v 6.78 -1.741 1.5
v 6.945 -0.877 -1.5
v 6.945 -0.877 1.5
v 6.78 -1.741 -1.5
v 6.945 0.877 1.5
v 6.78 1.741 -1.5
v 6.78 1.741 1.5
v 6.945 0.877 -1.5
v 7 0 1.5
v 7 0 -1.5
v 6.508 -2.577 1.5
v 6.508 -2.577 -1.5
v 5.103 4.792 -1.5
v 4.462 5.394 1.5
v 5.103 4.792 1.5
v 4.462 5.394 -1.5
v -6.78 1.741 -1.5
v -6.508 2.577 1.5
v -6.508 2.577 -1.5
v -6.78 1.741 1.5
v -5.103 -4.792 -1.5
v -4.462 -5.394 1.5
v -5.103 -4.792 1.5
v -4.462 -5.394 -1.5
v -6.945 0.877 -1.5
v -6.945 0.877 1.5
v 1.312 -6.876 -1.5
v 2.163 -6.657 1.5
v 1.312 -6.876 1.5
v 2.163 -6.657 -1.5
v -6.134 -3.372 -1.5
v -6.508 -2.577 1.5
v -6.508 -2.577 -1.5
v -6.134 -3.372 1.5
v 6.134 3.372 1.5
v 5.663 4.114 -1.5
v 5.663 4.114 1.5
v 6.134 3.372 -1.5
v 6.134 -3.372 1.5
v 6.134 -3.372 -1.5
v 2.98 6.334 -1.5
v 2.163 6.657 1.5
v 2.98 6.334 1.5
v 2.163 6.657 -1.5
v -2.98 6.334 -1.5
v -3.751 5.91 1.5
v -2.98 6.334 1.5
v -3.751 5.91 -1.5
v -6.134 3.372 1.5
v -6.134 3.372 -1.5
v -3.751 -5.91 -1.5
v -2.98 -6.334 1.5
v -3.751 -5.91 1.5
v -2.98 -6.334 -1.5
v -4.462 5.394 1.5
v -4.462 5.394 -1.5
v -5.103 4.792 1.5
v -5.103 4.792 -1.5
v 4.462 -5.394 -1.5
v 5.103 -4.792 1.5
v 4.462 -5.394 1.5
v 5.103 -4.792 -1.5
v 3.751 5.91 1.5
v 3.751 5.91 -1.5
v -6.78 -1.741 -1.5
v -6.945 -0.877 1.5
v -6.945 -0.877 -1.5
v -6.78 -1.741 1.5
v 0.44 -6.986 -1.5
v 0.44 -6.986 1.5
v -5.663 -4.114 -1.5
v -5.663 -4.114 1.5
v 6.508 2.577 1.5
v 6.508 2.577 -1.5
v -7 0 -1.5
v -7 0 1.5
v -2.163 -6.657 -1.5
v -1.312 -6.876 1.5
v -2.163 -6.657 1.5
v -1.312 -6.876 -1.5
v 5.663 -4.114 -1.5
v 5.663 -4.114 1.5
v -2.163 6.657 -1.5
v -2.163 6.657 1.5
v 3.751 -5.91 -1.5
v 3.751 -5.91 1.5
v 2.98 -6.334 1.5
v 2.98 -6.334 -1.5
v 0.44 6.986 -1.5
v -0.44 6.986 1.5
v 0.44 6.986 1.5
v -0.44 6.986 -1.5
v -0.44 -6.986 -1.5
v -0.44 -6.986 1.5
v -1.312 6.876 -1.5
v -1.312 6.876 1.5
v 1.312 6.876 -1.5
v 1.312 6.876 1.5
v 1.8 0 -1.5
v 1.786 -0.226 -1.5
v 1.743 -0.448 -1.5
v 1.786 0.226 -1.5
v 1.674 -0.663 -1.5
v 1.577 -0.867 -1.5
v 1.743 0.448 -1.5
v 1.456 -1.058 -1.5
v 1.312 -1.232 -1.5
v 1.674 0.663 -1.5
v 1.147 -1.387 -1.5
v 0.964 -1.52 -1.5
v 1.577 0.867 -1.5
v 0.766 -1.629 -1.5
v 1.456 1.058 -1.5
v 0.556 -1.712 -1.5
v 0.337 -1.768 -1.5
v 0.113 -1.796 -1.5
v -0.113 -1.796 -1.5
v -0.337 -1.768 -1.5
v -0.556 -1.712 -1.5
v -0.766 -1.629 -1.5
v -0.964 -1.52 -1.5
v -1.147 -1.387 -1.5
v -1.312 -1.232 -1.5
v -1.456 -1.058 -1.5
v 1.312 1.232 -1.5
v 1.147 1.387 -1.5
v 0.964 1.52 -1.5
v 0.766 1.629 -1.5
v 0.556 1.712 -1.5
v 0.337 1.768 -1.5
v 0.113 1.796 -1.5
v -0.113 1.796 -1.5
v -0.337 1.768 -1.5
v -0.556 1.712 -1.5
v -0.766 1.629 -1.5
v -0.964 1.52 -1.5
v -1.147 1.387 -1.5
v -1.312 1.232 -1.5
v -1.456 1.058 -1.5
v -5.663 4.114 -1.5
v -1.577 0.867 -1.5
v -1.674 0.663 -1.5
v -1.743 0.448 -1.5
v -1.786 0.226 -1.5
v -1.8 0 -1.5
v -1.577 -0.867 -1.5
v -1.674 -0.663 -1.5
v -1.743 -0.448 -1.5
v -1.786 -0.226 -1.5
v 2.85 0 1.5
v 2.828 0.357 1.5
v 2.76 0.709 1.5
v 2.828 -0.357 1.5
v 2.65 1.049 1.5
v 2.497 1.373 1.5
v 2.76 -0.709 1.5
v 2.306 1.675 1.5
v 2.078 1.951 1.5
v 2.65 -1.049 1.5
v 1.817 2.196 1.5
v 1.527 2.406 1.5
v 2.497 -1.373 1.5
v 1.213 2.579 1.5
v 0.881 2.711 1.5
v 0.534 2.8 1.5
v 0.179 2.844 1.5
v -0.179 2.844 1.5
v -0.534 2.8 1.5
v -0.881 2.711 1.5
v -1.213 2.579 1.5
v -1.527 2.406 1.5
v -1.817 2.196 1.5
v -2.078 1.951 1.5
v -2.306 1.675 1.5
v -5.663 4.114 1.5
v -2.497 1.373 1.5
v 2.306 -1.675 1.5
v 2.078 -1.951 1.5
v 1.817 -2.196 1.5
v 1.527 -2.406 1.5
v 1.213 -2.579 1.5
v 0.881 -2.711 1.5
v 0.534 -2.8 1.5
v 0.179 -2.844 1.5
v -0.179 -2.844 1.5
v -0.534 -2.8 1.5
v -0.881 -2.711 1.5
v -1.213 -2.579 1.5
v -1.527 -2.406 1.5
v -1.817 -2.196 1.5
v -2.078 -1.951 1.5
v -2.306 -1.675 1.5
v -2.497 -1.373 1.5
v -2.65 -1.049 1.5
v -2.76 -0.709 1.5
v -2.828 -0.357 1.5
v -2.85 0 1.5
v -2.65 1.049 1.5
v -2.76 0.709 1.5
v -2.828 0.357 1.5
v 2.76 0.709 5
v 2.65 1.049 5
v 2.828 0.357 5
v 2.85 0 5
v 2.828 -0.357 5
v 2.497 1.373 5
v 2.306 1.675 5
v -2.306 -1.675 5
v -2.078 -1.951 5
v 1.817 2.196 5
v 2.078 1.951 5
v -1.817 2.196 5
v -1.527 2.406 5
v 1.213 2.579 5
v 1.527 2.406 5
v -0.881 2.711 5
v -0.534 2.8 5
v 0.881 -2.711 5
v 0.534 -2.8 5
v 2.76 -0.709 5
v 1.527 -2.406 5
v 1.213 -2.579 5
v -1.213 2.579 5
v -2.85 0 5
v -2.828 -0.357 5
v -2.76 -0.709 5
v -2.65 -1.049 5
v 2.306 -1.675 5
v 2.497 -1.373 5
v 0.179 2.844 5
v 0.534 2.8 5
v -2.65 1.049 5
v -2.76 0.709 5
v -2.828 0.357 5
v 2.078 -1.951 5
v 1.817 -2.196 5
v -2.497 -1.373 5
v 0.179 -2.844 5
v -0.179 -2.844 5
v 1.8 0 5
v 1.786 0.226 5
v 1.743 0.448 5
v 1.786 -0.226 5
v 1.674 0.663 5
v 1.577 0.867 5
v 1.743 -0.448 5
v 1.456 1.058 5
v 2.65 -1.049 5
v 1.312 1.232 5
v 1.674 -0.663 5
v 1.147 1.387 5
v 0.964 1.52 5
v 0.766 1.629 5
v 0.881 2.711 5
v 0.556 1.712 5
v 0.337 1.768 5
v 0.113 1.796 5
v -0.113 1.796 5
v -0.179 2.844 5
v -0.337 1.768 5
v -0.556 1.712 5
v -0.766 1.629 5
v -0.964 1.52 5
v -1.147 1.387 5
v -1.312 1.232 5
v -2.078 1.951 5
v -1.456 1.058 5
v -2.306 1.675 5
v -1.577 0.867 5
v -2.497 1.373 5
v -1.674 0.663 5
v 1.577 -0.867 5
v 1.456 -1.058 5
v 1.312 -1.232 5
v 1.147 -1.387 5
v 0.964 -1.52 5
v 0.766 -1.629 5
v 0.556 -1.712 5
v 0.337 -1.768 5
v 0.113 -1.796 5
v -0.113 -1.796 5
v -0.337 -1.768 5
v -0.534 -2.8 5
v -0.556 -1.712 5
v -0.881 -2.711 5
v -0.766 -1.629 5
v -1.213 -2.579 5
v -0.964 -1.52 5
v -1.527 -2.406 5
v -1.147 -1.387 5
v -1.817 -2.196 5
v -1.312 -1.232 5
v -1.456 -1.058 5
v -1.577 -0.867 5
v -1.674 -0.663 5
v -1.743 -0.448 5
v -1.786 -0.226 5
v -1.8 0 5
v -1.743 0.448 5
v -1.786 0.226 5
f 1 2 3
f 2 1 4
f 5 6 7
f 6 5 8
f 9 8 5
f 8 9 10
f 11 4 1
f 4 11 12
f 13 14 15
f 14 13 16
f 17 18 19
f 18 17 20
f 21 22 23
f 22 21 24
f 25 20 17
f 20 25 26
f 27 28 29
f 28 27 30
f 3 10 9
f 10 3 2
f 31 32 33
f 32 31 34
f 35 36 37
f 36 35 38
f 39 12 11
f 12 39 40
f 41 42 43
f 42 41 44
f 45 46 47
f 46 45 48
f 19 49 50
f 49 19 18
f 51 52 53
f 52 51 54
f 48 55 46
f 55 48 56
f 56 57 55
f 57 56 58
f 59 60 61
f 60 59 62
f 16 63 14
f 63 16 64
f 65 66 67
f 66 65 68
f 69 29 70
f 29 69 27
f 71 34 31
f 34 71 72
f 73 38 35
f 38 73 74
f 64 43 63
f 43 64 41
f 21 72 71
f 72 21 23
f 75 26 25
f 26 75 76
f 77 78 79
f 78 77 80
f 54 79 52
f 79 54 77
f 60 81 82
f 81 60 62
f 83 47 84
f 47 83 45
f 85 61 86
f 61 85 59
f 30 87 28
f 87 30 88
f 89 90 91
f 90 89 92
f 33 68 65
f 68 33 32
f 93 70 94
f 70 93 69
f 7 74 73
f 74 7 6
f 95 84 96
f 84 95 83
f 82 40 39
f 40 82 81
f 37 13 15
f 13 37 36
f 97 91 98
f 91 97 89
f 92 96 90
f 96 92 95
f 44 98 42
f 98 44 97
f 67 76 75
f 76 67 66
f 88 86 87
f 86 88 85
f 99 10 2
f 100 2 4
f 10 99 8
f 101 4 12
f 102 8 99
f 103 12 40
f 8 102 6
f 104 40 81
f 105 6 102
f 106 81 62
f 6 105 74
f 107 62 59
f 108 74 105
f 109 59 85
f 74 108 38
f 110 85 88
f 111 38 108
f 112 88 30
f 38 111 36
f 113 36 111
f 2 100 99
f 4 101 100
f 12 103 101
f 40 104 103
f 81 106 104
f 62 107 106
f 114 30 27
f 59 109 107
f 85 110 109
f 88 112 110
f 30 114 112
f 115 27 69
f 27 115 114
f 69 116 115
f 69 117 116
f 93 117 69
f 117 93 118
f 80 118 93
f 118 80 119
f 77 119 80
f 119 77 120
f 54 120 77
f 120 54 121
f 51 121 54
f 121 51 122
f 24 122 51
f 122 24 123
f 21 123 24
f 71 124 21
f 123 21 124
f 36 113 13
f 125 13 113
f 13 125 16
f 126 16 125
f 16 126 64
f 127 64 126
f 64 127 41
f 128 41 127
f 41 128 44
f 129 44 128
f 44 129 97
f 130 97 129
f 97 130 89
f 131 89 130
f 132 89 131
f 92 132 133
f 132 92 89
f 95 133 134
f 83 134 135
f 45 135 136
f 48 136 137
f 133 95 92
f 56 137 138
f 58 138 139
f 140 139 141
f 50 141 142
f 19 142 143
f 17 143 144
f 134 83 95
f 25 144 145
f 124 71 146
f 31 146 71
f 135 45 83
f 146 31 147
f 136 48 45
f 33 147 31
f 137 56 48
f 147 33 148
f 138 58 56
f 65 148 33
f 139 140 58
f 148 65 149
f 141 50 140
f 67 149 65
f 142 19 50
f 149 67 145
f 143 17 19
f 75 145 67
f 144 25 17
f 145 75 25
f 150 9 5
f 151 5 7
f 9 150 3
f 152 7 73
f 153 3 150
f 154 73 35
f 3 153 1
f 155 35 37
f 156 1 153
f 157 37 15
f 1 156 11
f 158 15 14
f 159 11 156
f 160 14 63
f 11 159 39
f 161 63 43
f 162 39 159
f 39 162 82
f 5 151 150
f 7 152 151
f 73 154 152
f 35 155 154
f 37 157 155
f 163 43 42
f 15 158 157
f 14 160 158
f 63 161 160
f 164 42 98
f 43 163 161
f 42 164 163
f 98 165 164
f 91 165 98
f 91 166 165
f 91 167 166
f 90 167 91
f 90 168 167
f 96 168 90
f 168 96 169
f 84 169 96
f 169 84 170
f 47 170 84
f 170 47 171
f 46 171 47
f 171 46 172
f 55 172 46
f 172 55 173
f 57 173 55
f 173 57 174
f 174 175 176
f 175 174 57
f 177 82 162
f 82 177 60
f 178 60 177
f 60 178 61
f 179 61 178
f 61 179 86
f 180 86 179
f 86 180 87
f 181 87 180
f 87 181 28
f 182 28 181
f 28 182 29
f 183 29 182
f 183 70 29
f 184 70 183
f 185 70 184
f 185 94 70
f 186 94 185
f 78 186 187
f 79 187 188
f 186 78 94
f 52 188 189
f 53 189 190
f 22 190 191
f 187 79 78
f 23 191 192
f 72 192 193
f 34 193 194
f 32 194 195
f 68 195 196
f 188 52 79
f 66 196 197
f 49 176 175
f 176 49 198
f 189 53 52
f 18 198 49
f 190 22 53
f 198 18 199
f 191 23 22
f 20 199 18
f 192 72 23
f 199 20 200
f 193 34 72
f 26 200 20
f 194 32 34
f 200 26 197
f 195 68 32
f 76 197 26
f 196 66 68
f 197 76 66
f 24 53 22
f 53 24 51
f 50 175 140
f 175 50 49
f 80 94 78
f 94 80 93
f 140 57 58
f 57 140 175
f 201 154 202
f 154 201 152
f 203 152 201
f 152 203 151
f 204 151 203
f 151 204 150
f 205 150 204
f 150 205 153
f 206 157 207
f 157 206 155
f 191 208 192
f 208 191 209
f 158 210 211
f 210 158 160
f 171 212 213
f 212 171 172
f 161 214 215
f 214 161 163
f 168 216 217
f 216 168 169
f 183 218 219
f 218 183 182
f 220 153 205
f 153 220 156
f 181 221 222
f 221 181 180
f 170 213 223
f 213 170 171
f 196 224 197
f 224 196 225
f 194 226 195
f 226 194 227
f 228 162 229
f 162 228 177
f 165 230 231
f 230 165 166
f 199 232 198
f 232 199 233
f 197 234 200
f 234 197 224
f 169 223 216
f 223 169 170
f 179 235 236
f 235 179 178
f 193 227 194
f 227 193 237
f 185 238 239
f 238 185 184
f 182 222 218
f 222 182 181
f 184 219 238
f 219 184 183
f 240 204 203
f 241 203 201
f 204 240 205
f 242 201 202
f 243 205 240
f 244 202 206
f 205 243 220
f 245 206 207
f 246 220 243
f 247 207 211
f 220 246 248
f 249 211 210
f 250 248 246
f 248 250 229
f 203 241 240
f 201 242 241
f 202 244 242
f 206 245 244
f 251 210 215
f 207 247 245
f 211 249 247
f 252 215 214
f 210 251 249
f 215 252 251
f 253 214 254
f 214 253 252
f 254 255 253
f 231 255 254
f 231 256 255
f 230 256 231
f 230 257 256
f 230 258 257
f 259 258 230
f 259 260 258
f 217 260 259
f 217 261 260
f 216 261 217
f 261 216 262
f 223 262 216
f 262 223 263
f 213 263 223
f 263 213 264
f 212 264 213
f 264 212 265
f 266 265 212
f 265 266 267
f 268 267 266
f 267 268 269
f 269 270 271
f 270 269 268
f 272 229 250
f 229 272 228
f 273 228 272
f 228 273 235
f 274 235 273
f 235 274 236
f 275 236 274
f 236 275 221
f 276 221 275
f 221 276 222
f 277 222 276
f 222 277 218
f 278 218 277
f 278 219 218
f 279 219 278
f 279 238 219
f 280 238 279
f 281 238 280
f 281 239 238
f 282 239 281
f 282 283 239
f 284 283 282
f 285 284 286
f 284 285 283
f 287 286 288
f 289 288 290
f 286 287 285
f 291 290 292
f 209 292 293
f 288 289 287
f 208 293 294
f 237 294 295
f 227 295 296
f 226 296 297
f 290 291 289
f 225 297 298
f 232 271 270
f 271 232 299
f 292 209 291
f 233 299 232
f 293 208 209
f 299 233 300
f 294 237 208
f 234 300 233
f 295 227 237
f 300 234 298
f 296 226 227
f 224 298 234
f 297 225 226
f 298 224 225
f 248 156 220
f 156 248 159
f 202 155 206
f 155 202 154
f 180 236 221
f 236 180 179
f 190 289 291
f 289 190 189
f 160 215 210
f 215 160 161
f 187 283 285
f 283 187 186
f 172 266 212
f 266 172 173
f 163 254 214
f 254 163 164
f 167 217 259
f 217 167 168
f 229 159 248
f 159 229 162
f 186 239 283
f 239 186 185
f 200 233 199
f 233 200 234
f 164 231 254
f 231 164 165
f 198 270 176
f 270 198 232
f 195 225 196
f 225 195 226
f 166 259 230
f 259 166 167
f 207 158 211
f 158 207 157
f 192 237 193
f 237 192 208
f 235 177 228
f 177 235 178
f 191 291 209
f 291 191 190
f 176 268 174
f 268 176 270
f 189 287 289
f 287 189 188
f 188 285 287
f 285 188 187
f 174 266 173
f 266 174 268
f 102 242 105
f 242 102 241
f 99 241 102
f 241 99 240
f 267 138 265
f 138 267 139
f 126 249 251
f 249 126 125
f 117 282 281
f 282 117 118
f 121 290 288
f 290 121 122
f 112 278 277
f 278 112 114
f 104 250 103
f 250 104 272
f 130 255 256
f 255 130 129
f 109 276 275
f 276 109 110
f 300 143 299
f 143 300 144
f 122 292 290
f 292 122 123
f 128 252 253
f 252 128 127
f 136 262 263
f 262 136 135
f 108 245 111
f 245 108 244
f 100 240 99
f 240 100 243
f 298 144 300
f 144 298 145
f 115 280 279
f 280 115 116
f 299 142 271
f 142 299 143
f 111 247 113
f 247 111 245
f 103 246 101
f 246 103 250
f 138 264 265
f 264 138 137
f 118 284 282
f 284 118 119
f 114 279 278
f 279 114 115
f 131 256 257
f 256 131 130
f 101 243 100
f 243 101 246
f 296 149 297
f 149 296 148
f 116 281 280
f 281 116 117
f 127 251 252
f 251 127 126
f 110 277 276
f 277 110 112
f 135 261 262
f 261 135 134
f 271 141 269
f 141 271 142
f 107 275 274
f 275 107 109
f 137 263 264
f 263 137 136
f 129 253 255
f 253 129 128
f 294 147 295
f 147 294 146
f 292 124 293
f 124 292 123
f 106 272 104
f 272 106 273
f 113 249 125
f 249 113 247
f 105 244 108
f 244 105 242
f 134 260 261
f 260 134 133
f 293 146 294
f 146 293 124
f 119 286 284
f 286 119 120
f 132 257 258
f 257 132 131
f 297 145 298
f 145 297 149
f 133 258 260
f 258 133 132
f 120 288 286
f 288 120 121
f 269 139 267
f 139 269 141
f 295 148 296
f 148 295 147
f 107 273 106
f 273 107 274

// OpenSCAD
$fn = 50;


difference() {
	union() {
		translate(v = [0, 0, -1.5000000000]) {
			cylinder(h = 3, r = 7.0000000000);
		}
		translate(v = [0, 0, -1.5000000000]) {
			cylinder(h = 6.5000000000, r = 2.8500000000);
		}
	}
	union() {
		translate(v = [0, 0, -50.0000000000]) {
			cylinder(h = 100, r = 1.8000000000);
		}
	}
}
